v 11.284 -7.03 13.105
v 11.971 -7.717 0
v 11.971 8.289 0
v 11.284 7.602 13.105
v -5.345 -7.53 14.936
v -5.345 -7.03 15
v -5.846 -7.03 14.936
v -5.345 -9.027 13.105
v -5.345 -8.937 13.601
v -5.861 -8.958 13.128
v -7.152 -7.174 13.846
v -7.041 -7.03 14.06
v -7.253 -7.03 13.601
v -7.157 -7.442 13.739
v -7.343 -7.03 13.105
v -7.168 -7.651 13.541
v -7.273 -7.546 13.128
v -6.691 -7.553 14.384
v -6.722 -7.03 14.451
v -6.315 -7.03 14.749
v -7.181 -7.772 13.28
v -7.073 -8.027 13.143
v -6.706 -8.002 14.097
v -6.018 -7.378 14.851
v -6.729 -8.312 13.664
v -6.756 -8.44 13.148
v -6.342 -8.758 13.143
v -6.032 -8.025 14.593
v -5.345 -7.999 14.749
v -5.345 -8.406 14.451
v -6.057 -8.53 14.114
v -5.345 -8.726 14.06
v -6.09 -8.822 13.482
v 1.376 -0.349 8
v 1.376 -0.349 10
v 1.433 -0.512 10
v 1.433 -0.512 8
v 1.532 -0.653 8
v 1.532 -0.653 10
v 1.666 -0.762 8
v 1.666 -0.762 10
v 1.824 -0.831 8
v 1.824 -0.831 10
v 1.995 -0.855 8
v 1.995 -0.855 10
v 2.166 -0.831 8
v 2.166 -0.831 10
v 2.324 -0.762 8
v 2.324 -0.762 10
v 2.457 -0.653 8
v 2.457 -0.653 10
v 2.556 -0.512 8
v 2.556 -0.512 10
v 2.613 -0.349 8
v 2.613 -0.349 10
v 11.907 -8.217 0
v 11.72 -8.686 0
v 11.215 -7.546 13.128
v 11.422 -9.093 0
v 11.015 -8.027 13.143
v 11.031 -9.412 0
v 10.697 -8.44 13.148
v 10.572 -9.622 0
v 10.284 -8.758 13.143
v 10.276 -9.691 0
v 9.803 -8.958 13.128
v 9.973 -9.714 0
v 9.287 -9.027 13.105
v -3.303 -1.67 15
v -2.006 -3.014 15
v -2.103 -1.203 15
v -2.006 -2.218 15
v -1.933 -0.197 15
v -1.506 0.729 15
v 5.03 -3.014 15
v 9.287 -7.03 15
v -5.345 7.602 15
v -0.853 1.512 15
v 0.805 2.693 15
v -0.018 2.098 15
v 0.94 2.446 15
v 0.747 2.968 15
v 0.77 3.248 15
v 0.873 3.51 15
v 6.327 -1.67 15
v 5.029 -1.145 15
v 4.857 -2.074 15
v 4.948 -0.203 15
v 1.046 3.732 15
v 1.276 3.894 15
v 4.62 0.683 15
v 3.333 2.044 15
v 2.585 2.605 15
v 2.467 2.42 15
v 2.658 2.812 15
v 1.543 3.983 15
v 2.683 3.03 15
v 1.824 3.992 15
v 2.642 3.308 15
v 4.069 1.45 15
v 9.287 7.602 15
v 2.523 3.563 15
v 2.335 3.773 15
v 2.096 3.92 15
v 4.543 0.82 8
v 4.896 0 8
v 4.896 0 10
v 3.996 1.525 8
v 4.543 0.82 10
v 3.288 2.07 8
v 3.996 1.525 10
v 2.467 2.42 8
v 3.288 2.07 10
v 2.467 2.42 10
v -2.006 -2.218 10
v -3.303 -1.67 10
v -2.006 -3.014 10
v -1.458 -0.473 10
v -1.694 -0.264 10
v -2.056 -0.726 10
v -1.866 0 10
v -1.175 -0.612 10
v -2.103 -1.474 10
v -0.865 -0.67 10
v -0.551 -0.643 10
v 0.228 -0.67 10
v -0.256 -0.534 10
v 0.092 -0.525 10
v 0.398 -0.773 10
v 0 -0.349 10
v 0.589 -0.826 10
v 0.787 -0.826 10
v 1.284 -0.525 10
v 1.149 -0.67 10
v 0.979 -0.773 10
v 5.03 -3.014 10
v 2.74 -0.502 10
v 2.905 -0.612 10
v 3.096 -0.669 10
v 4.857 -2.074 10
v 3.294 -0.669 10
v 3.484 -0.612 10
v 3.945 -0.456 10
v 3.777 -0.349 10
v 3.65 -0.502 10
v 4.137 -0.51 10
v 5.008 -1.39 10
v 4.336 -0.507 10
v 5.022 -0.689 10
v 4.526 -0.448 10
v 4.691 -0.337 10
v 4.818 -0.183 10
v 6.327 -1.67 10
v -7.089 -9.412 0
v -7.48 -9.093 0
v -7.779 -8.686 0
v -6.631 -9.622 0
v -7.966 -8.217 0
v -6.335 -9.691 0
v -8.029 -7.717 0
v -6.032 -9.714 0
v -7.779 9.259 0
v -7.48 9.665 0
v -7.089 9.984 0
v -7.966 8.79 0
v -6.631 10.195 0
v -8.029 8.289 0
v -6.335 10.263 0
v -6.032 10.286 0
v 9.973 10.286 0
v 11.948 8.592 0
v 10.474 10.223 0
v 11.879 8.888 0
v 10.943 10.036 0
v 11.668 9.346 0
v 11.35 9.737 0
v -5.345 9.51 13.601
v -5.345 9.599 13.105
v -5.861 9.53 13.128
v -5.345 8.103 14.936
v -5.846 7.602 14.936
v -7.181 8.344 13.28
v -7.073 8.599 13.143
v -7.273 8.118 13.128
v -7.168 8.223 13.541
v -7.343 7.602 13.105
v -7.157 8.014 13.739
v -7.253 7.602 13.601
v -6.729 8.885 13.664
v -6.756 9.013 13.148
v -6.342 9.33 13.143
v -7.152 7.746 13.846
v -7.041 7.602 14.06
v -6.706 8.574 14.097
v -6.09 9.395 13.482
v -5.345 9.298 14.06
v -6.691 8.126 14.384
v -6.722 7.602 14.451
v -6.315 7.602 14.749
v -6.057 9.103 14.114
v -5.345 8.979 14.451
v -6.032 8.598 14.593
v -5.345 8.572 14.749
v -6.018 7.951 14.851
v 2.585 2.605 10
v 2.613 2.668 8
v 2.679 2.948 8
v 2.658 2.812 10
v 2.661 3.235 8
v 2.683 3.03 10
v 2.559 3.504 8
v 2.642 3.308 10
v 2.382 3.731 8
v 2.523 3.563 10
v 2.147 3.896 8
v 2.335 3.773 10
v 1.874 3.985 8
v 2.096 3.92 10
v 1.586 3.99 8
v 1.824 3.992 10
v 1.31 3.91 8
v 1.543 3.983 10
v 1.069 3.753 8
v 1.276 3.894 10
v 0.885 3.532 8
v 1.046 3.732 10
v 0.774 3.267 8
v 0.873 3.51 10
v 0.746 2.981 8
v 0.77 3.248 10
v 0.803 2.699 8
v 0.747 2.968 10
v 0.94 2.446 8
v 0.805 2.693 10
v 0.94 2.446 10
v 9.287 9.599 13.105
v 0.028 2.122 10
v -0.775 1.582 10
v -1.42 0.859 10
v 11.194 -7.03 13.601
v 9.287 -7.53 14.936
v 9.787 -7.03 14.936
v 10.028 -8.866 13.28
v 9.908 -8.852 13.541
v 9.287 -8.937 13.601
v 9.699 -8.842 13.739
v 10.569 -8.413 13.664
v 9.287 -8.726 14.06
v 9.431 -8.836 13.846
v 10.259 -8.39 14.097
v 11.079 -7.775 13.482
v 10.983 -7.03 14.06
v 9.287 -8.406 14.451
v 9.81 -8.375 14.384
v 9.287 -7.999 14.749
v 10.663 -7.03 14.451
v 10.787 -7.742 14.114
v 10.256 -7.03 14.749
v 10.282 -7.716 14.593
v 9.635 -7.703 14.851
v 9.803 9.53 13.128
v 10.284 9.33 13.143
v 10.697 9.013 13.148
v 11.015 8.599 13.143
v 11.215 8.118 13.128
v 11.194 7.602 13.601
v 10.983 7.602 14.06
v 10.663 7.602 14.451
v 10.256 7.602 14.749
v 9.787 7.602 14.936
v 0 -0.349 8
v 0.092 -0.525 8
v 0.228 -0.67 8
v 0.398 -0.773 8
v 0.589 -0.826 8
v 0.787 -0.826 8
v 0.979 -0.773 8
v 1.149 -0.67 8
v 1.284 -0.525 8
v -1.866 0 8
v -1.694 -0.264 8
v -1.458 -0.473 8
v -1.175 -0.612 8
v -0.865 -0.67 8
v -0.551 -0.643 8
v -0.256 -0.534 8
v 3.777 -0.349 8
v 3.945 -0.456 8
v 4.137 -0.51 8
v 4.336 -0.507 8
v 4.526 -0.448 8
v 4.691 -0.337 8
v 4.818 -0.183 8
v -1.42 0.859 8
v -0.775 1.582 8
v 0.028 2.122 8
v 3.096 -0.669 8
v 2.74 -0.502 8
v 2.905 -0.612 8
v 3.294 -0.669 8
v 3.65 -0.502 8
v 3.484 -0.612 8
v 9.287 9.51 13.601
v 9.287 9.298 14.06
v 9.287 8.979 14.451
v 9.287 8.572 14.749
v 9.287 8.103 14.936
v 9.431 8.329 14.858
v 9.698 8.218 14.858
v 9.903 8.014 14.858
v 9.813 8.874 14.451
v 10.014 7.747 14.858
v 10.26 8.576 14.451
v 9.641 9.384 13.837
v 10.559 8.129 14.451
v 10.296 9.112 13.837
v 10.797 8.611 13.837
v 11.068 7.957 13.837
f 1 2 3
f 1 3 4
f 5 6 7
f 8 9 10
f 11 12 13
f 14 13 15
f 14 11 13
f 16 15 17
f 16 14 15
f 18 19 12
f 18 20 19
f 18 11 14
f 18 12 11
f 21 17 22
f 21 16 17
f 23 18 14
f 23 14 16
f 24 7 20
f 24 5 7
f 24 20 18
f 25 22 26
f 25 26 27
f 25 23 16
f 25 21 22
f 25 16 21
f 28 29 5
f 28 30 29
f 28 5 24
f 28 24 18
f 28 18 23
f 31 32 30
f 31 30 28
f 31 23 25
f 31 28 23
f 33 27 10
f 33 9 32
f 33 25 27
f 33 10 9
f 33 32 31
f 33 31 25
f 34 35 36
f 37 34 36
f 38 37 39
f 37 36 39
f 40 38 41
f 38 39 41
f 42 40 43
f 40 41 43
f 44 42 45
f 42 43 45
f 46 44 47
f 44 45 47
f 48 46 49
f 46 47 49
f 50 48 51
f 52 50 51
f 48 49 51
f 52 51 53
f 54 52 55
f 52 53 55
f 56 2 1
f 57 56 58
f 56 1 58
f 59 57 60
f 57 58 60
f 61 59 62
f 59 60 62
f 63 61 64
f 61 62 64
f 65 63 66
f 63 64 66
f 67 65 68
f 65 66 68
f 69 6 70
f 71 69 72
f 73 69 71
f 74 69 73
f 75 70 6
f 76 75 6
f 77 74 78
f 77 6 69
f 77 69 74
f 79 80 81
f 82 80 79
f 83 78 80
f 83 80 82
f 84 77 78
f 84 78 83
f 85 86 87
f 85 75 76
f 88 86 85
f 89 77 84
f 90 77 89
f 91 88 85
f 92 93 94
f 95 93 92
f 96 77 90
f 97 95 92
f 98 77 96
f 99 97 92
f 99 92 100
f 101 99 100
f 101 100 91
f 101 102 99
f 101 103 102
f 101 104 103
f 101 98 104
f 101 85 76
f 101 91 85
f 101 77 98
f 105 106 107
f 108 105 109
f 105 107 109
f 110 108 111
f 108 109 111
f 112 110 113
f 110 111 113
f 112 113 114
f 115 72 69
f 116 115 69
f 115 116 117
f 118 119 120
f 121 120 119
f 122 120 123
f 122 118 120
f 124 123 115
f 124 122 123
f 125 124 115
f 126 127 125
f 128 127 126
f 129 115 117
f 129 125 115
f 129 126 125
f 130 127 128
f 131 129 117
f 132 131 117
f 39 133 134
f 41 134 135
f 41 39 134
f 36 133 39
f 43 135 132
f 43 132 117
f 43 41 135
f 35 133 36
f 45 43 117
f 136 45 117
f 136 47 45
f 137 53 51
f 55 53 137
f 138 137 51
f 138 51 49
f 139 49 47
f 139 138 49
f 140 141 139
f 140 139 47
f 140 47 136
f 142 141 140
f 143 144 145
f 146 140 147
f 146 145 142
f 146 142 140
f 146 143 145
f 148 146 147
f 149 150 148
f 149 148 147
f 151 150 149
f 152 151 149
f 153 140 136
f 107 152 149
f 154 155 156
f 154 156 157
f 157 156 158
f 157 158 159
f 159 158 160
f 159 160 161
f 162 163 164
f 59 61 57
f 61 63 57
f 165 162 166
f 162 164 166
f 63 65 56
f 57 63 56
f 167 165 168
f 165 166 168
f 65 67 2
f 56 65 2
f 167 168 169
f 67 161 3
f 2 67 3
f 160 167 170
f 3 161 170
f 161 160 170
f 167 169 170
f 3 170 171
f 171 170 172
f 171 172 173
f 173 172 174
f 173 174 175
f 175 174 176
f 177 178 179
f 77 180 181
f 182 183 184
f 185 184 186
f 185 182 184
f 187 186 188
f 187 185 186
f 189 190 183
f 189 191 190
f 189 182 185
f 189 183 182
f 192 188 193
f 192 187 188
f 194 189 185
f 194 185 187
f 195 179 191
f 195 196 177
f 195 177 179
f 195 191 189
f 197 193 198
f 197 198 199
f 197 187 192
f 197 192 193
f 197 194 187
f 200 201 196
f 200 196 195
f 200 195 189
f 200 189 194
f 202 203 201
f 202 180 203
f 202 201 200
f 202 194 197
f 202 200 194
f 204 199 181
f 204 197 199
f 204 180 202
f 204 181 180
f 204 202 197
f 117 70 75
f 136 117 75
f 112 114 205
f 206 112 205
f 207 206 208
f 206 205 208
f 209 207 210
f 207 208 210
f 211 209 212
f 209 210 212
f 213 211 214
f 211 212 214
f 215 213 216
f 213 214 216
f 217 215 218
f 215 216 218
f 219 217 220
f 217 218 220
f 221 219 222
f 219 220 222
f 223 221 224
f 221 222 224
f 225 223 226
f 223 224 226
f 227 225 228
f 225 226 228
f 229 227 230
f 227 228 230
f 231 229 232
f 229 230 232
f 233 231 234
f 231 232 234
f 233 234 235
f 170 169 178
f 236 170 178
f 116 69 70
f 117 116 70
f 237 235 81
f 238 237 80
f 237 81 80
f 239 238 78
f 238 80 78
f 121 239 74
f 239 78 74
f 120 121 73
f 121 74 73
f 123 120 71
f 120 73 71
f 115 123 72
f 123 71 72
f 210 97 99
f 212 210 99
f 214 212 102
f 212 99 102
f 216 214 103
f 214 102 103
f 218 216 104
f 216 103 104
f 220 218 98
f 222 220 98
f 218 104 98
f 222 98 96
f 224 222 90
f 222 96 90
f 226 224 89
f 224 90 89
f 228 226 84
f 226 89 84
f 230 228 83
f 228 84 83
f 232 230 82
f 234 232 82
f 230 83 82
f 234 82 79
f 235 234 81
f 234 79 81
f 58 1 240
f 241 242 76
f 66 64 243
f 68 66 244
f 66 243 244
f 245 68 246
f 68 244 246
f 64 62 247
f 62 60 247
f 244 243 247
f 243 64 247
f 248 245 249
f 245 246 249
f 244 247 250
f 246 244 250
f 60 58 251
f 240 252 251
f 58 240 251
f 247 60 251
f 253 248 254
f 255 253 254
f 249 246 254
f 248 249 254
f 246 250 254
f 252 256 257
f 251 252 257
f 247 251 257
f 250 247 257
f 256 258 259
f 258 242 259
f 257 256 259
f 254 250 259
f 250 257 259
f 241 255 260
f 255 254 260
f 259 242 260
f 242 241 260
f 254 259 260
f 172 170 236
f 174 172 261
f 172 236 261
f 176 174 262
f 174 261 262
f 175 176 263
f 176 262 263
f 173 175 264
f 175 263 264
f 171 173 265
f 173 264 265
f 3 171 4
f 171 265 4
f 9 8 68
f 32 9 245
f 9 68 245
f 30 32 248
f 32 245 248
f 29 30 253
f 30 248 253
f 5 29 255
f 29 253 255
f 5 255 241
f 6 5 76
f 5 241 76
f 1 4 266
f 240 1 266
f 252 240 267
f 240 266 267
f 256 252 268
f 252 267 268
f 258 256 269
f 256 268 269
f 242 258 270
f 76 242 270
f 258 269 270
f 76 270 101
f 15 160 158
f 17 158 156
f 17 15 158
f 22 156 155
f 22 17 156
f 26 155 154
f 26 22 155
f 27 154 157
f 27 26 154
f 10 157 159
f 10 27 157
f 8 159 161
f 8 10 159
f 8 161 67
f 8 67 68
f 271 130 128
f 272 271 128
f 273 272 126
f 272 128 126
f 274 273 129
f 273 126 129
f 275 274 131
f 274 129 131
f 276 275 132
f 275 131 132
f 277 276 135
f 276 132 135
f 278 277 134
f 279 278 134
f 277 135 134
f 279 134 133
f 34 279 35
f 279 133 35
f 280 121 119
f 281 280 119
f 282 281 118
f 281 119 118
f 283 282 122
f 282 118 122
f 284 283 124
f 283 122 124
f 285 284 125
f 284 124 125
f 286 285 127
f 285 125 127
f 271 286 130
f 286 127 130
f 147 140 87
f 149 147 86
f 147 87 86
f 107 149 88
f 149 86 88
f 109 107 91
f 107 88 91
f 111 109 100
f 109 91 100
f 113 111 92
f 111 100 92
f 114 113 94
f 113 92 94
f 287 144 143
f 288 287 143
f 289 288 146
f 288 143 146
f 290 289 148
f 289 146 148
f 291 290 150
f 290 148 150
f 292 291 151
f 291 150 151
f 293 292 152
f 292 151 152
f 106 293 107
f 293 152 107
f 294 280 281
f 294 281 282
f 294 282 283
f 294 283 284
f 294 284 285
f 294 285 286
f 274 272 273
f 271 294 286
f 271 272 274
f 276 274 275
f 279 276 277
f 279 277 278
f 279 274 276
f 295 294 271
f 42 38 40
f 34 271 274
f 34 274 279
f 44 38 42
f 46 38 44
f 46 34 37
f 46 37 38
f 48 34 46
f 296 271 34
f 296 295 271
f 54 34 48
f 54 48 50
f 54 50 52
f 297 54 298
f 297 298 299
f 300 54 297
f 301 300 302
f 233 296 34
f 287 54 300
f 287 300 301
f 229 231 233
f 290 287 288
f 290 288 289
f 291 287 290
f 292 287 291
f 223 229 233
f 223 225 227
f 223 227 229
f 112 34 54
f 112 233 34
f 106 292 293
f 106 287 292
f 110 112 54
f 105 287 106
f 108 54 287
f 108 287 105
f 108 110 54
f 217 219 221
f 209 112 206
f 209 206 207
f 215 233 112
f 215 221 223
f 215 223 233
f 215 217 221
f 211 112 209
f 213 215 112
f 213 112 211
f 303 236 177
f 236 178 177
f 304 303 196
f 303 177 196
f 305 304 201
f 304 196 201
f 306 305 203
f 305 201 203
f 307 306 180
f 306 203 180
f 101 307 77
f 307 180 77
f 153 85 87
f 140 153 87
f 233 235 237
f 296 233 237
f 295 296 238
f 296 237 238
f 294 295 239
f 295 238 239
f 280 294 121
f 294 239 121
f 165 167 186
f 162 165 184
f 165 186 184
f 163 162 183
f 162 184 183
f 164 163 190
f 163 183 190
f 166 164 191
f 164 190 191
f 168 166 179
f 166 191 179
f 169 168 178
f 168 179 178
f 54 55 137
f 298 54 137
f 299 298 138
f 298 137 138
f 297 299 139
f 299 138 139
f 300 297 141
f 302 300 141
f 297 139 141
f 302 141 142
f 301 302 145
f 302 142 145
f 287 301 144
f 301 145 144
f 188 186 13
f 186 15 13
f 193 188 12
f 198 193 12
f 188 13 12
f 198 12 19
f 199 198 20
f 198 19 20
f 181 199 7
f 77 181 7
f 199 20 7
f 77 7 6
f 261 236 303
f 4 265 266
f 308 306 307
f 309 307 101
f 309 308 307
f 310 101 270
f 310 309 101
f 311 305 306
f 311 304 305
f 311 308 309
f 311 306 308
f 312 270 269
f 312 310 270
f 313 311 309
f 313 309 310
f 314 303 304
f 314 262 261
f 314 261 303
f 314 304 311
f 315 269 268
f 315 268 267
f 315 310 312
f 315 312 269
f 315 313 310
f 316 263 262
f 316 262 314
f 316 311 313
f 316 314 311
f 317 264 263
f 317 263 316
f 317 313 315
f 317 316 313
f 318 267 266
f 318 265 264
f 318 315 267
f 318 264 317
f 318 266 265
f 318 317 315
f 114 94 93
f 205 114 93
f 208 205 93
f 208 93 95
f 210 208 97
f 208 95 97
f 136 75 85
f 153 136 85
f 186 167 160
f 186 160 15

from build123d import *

# Parameters (mm, degrees)
F0_W     = 20
F0_H     = 20
F1_DEPTH = 15
F1_TAPER = 3
F2_R     = 2
F4_DEPTH = 5
F6_DEPTH = 2


with BuildPart() as f1:
    # F0 (on Top) → F1 (new body)
    with BuildSketch(Plane.XY):
        with Locations((1.9706902094, 0.2862163961)):
            Rectangle(F0_W, F0_H)
    extrude(amount=F1_DEPTH, taper=F1_TAPER)

    # F2
    f2_edges = [f1.edges().sort_by_distance(p)[0] for p in [
        (11.577632, 9.893158, 7.5),
        (1.97069, 9.5001, 15),
        (-7.636251, 9.893158, 7.5),
        (11.184574, 0.286216, 15),
        (11.577632, -9.320725, 7.5),
        (1.97069, -8.927667, 15),
        (-7.243193, 0.286216, 15),
        (-7.636251, -9.320725, 7.5),
    ]]
    fillet(f2_edges, radius=F2_R)

    # F3 (on face) → F4 (cut)
    with BuildSketch(Plane.XY.offset(15)):
        with BuildLine():
            ThreePointArc((2.4668298597, 2.420319631), (2.6270550618, 2.7065444383), (2.6825853886, 3.0298293568))
            ThreePointArc((2.6825853886, 3.0298293568), (1.4060278584, 3.9484621473), (0.9404779675, 2.446214288))
            ThreePointArc((0.9404779675, 2.446214288), (1.6973410612, 2.0611579891), (2.4668298597, 2.420319631))
        make_face()
        with BuildLine():
            ThreePointArc((2.4668298597, 2.420319631), (1.6973410612, 2.0611579891), (0.9404779675, 2.446214288))
            ThreePointArc((0.9404779675, 2.446214288), (-1.5061031251, 0.7291430041), (-2.005701419, -2.2178036161))
            Line((-2.005701419, -2.2178036161), (-3.3031930216, -1.6699736007))
            Line((-3.3031930216, -1.6699736007), (-2.005701419, -3.0136309616))
            Line((-2.005701419, -3.0136309616), (5.0295870751, -3.0136309616))
            Line((5.0295870751, -3.0136309616), (6.3270786777, -1.6699736007))
            Line((6.3270786777, -1.6699736007), (4.8565878533, -2.0736376755))
            ThreePointArc((4.8565878533, -2.0736376755), (4.6201459688, 0.6830104281), (2.4668298597, 2.420319631))
        make_face()
    extrude(amount=-F4_DEPTH, mode=Mode.SUBTRACT)

    # F5 (on face) → F6 (cut)
    with BuildSketch(Plane.XY.offset(10)):
        with BuildLine():
            ThreePointArc((0.9404779675, 2.446214288), (-0.7753137079, 1.5817313603), (-1.8659088252, 0))
            ThreePointArc((-1.8659088252, 0), (-1.0221589161, -0.6510962238), (0, -0.3493822005))
            ThreePointArc((0, -0.3493822005), (0.6882312009, -0.8328877124), (1.3764624018, -0.3493822005))
            ThreePointArc((1.3764624018, -0.3493822005), (1.9947274122, -0.8549416092), (2.6129924227, -0.3493822005))
            ThreePointArc((2.6129924227, -0.3493822005), (3.1948891701, -0.6762140192), (3.7767859176, -0.3493822005))
            ThreePointArc((3.7767859176, -0.3493822005), (4.4330516654, -0.4840787766), (4.8961884025, 0))
            ThreePointArc((4.8961884025, 0), (3.9955688533, 1.5253924233), (2.4668298597, 2.420319631))
            ThreePointArc((2.4668298597, 2.420319631), (1.7302082041, 3.9985007245), (0.9404779675, 2.446214288))
        make_face()
    extrude(amount=-F6_DEPTH, mode=Mode.SUBTRACT)


solid = f1.part
